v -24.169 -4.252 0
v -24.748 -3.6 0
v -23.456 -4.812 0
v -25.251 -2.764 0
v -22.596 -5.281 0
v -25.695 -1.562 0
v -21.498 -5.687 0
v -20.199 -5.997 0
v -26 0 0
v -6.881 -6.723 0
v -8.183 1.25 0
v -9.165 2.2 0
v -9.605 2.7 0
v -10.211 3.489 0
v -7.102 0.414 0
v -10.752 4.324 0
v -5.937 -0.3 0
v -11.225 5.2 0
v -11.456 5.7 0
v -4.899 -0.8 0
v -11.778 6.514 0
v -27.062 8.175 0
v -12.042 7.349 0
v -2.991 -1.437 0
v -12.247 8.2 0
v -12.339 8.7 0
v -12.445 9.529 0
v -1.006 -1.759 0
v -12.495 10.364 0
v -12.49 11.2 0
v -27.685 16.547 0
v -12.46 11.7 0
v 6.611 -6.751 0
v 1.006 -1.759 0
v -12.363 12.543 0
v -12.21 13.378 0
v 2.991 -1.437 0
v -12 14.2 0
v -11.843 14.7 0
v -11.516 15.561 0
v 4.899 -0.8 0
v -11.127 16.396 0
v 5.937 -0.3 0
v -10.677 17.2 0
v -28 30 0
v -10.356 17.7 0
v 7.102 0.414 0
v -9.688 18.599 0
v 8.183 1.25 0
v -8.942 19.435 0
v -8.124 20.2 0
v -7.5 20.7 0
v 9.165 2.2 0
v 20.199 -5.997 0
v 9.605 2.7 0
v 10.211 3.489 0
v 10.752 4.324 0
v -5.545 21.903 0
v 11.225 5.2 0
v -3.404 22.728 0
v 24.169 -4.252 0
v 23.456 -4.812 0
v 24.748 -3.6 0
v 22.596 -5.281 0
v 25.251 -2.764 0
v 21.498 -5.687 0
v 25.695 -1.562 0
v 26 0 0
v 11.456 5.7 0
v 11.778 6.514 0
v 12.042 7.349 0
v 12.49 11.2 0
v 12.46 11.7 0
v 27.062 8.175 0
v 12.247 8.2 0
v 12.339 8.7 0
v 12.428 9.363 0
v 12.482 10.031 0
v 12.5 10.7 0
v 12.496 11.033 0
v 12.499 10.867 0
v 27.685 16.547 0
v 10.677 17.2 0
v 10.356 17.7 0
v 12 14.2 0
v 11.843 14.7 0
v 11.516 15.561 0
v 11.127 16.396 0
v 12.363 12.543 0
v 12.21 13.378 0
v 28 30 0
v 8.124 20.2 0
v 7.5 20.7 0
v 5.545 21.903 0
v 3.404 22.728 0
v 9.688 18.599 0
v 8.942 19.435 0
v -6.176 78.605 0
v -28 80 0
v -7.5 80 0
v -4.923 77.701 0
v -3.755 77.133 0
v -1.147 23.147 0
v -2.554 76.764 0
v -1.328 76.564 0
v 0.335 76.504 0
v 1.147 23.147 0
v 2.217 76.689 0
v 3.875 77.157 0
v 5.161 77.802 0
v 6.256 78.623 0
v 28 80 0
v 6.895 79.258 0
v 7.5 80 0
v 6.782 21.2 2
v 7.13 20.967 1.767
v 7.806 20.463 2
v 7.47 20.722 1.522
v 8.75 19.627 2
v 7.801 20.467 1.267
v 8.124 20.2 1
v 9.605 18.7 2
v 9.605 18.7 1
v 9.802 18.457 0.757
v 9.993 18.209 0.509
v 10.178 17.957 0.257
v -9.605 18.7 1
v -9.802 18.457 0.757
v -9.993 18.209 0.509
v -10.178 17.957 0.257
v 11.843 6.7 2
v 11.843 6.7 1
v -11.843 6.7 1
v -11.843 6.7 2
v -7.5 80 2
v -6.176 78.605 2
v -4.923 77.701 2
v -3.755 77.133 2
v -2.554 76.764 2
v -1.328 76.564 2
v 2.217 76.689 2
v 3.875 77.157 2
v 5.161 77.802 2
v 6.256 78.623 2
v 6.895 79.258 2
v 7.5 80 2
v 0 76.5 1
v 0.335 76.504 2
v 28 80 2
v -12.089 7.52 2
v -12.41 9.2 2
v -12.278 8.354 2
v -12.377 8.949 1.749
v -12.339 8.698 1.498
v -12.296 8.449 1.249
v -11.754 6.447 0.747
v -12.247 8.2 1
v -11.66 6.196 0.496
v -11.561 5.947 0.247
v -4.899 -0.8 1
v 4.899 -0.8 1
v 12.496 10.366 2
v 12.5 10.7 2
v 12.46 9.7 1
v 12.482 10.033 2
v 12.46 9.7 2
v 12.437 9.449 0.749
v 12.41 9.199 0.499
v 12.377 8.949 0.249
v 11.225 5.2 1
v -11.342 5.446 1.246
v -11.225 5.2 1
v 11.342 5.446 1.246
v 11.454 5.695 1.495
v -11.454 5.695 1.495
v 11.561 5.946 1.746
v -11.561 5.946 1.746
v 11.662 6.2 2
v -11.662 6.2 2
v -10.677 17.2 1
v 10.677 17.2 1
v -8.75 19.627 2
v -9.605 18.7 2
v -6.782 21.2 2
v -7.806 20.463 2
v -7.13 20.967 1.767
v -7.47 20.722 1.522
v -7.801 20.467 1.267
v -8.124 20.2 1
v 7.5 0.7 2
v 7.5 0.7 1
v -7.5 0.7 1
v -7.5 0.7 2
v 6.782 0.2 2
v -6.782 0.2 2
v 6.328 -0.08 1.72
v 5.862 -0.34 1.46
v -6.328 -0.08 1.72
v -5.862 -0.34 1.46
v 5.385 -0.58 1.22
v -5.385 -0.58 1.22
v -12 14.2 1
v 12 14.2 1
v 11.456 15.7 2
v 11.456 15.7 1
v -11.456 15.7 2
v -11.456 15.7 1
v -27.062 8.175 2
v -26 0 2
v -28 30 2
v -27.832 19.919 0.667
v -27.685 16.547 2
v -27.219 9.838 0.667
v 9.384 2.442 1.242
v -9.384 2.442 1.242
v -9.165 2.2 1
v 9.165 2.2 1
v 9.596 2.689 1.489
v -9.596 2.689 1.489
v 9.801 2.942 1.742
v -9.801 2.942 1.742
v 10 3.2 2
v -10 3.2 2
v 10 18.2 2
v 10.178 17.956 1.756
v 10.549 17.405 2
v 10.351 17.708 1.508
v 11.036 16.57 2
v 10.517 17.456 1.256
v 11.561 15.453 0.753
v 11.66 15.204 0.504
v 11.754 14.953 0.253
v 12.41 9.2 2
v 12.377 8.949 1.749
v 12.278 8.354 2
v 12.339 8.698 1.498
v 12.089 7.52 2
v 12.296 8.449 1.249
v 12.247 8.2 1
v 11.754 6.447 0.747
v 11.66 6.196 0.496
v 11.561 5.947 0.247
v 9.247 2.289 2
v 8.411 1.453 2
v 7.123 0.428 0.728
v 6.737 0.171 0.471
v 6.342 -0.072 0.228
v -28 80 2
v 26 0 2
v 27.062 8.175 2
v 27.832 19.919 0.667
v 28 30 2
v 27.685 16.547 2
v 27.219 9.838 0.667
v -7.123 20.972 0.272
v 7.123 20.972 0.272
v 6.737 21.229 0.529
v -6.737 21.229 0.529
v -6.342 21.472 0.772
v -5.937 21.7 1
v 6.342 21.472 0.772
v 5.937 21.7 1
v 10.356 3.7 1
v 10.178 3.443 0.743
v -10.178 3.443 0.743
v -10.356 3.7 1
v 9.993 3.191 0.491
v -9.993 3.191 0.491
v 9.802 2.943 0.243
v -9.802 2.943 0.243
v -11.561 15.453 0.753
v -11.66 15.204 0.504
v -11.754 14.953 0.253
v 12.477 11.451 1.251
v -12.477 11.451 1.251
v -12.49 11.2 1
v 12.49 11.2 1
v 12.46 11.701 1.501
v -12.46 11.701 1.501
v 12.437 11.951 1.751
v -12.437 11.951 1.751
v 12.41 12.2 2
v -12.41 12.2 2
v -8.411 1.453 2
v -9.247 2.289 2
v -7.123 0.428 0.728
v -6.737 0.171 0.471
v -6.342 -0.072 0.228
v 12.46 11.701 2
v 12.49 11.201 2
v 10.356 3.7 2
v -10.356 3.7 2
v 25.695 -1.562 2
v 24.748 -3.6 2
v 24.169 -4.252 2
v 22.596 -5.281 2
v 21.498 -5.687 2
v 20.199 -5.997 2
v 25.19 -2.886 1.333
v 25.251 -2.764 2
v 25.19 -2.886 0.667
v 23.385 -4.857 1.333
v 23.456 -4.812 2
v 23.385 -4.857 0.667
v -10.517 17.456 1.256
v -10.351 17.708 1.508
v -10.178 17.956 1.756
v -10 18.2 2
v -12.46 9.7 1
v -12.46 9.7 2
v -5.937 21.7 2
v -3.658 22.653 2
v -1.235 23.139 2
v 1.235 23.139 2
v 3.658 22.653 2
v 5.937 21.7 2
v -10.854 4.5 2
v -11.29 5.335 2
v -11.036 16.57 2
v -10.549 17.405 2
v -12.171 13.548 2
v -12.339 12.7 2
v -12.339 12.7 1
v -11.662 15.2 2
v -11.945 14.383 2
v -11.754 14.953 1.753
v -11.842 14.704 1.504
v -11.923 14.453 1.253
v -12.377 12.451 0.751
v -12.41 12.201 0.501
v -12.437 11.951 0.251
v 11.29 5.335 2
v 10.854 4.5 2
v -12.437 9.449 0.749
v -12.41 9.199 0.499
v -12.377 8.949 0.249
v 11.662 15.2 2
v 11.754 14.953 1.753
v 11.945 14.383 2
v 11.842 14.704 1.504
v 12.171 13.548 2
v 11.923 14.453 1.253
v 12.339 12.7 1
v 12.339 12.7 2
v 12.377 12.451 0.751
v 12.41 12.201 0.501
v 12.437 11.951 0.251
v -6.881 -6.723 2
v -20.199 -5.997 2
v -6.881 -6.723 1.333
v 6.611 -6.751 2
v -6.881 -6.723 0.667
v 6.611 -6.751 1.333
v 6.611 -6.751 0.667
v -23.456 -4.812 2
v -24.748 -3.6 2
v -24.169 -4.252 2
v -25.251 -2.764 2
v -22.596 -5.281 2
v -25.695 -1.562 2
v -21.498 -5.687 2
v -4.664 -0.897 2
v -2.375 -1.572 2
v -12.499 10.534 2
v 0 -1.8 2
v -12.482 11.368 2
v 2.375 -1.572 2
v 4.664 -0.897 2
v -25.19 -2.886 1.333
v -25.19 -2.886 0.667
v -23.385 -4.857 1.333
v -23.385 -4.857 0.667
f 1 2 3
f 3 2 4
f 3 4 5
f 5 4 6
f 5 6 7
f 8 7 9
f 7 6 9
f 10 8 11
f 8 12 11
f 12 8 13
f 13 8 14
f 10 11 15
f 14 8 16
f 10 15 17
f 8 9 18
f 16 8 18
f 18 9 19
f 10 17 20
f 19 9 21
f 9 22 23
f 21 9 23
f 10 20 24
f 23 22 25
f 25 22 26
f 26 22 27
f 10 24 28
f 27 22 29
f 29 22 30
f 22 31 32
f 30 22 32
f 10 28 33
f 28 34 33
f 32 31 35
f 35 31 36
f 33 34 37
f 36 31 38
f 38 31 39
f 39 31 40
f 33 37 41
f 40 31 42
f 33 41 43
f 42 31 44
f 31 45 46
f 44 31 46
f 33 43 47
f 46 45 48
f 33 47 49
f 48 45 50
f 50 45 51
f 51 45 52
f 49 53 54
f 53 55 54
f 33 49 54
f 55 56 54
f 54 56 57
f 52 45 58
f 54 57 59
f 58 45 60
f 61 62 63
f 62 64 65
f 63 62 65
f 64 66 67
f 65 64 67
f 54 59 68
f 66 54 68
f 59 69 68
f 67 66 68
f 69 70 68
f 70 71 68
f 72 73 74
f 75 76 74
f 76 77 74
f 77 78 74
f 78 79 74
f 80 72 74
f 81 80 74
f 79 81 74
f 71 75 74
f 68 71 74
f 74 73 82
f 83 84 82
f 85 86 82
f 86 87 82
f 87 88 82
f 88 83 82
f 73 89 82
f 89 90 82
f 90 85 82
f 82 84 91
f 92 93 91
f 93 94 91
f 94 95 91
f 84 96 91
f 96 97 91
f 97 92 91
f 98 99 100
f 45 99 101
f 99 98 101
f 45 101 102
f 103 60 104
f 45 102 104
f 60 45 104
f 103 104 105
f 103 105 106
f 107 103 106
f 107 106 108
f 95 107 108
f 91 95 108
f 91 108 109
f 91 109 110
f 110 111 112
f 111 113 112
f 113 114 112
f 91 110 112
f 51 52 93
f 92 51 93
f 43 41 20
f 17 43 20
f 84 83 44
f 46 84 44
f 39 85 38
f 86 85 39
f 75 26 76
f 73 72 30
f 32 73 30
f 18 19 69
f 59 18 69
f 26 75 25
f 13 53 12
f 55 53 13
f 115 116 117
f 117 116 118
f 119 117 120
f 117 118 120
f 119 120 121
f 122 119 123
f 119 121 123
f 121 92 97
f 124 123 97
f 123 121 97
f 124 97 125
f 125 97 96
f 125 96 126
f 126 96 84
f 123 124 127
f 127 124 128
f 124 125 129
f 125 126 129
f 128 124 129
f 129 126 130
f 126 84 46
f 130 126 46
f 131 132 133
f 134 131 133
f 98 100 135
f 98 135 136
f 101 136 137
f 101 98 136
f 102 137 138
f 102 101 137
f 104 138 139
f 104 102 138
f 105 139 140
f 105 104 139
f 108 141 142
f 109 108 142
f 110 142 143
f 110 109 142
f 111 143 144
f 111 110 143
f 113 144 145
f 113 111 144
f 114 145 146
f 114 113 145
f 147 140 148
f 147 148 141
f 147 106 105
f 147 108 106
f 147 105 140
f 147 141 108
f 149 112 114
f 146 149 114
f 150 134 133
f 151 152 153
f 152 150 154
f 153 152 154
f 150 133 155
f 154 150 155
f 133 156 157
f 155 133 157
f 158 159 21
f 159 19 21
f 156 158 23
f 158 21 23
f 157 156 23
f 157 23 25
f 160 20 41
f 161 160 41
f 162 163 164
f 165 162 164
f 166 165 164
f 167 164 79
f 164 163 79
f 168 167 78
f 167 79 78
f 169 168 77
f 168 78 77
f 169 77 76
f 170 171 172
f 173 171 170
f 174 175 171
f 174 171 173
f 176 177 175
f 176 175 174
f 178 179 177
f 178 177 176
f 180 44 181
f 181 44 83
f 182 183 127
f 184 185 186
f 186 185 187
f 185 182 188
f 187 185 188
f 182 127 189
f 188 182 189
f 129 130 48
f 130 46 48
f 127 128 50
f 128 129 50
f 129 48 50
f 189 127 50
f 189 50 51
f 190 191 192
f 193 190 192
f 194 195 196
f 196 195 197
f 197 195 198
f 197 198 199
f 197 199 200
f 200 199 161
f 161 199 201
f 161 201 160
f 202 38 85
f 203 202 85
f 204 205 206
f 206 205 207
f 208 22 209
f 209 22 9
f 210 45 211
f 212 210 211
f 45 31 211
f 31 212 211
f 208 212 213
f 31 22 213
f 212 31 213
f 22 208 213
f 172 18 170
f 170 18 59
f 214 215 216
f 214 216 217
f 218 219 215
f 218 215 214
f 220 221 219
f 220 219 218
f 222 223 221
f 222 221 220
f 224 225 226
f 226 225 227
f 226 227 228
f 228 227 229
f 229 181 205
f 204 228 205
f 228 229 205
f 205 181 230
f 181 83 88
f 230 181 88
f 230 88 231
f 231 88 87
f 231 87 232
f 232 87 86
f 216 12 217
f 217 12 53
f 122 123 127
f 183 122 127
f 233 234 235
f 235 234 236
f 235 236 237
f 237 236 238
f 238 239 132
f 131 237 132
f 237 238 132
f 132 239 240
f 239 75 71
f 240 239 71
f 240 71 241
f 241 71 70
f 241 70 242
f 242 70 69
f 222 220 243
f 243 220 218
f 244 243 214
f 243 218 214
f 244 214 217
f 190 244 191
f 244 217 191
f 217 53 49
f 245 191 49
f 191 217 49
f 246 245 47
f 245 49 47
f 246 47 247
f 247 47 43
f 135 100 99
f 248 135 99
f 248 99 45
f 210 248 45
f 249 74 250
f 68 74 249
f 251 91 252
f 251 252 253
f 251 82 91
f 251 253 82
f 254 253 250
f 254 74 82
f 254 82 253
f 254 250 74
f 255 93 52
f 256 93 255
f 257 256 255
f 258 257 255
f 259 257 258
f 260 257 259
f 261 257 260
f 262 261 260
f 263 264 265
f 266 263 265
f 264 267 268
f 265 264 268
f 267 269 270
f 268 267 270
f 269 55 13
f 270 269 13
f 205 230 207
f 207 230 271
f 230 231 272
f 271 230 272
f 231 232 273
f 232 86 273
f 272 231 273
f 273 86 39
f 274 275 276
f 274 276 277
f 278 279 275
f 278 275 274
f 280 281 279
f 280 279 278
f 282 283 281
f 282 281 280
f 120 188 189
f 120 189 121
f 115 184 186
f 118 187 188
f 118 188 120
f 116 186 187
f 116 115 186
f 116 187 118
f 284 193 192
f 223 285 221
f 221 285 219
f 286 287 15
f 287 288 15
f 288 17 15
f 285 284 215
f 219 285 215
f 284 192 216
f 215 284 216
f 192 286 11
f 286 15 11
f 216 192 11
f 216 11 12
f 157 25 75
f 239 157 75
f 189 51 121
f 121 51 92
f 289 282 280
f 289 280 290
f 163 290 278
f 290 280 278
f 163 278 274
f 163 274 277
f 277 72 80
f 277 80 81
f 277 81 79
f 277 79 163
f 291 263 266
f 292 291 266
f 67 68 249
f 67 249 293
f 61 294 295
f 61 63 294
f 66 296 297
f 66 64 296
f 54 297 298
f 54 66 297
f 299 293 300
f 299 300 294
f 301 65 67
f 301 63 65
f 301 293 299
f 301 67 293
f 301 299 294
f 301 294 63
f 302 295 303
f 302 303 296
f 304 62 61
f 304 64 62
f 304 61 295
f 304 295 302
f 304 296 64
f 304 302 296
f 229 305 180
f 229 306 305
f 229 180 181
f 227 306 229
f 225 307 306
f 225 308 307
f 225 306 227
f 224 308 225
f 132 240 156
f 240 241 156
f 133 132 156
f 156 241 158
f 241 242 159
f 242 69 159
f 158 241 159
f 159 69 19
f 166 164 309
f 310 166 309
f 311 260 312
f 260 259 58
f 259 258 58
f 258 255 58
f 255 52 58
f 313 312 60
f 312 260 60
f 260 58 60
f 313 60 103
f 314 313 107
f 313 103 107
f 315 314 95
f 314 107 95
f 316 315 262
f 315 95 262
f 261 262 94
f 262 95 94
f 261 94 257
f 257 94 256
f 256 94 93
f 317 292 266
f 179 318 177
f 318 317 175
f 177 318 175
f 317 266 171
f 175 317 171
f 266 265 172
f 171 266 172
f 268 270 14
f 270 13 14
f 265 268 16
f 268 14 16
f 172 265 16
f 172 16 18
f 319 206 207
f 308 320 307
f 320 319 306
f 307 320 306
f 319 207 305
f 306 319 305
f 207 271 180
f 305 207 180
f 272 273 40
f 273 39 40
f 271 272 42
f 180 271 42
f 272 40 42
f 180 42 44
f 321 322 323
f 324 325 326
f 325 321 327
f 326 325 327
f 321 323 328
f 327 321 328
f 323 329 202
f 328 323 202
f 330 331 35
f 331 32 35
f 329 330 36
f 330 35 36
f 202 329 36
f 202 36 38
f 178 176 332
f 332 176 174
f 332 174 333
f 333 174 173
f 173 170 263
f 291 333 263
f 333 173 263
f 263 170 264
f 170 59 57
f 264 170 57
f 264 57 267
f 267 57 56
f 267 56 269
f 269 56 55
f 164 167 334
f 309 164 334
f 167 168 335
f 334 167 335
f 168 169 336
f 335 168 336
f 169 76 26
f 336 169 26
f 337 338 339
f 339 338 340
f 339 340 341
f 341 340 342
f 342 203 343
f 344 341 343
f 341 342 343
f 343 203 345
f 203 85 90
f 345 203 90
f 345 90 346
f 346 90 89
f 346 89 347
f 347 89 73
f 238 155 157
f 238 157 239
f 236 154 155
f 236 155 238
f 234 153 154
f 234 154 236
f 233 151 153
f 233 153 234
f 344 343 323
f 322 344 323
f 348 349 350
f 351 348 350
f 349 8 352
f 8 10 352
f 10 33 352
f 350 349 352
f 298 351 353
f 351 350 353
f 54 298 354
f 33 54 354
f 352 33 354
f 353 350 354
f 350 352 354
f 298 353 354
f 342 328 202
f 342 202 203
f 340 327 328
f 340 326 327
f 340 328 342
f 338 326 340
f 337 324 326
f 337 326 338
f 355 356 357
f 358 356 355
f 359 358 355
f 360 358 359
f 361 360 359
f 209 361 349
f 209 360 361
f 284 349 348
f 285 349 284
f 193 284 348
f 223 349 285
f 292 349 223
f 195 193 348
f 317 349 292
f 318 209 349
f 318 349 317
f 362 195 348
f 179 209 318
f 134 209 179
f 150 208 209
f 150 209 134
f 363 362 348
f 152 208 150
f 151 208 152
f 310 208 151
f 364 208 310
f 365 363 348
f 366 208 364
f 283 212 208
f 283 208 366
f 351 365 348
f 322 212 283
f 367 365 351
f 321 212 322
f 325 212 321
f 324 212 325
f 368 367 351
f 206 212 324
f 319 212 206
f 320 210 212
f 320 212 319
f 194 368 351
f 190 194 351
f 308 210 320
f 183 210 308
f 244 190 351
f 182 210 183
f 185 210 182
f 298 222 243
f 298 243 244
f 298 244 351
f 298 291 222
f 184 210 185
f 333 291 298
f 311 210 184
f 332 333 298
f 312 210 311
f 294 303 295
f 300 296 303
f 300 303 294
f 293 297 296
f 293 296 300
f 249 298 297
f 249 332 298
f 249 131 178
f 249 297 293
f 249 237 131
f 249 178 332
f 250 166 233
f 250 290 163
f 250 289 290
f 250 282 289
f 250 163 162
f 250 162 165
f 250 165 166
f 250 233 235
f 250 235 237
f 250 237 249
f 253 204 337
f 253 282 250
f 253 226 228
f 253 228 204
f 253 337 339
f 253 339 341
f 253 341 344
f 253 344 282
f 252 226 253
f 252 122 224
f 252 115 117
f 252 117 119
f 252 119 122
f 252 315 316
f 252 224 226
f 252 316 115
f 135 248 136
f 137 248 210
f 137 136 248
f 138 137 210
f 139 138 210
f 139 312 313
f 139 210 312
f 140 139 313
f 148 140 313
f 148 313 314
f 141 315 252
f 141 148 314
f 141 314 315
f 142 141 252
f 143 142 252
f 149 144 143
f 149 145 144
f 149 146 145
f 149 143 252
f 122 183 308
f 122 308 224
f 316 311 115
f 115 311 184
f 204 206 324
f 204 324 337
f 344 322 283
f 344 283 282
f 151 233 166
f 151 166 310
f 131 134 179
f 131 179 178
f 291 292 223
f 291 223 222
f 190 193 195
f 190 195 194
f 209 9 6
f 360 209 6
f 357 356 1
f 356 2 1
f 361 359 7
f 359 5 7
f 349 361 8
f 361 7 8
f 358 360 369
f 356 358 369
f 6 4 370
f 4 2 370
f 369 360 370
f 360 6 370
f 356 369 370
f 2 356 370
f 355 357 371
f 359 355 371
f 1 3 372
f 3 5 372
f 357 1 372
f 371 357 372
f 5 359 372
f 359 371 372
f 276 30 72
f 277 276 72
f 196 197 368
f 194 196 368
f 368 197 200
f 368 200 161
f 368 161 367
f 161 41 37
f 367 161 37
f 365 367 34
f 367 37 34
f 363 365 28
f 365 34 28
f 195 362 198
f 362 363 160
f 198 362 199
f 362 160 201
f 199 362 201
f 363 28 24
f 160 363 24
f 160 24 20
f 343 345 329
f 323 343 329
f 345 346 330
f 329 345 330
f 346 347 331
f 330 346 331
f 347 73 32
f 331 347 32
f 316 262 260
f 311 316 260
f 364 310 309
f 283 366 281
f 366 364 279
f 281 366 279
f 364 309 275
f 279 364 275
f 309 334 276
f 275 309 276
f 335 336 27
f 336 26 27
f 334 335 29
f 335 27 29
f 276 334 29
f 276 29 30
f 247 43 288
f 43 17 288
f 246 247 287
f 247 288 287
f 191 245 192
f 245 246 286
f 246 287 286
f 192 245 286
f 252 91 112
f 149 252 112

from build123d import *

# Parameters (mm, degrees)
F1_DEPTH = 2
F2_SIZE  = 1


with BuildPart() as f1:
    # F0 (on Top) → F1 (new body)
    with BuildSketch(Plane.XY):
        with BuildLine():
            Line((-7.5, 80), (-28, 80))
            Line((-28, 80), (-28, 30))
            add(Edge.make_bspline(
                [(-28, 30), (-28, 20), (-27.575813, 9.636616), (-26, 0)],
                knots=[0, 0, 0, 0, 30.066593, 30.066593, 30.066593, 30.066593], degree=3))
            add(Edge.make_bspline(
                [(-26, 0), (-25.558101, -3.369557), (-24.204869, -5.246621), (-20.199219, -5.996692)],
                knots=[0, 0, 0, 0, 8.343223, 8.343223, 8.343223, 8.343223], degree=3))
            add(Edge.make_bspline(
                [(-20.199219, -5.996692), (-6.993402, -7.045466), (6.588119, -7.168934), (20.199219, -5.996692)],
                knots=[0, 0, 0, 0, 40.398437, 40.398437, 40.398437, 40.398437], degree=3))
            add(Edge.make_bspline(
                [(26, 0), (25.558101, -3.369557), (24.204869, -5.246621), (20.199219, -5.996692)],
                knots=[0, 0, 0, 0, 8.343223, 8.343223, 8.343223, 8.343223], degree=3))
            add(Edge.make_bspline(
                [(28, 30), (28, 20), (27.575813, 9.636616), (26, 0)],
                knots=[0, 0, 0, 0, 30.066593, 30.066593, 30.066593, 30.066593], degree=3))
            Line((28, 30), (28, 80))
            Line((28, 80), (7.5, 80))
            add(Edge.make_bspline(
                [(-7.5, 80), (-5.275334, 77.19822), (-0.081008, 75.80178), (5.43735, 77.19822), (7.5, 80)],
                knots=[0, 0, 0, 0, 8.276473, 16.552945, 16.552945, 16.552945, 16.552945], degree=3))
        make_face()
        with BuildLine():
            ThreePointArc((12.489996, 11.2), (12.497499, 10.95005), (12.5, 10.7))
            ThreePointArc((12.5, 10.7), (12.48998, 10.199599), (12.459936, 9.7))
            ThreePointArc((12.459936, 9.7), (12.376438, 8.946778), (12.247449, 8.2))
            ThreePointArc((12.247449, 8.2), (12.068411, 7.443706), (11.842719, 6.7))
            ThreePointArc((11.842719, 6.7), (11.558205, 5.939968), (11.224972, 5.2))
            ThreePointArc((11.224972, 5.2), (10.816598, 4.434921), (10.356158, 3.7))
            ThreePointArc((10.356158, 3.7), (9.789427, 2.927155), (9.165151, 2.2))
            ThreePointArc((9.165151, 2.2), (8.366261, 1.412606), (7.5, 0.7))
            ThreePointArc((7.5, 0.7), (6.244692, -0.128381), (4.898979, -0.8))
            ThreePointArc((4.898979, -0.8), (0, -1.8), (-4.898979, -0.8))
            ThreePointArc((-4.898979, -0.8), (-6.244692, -0.128381), (-7.5, 0.7))
            ThreePointArc((-7.5, 0.7), (-8.366261, 1.412606), (-9.165151, 2.2))
            ThreePointArc((-9.165151, 2.2), (-9.789427, 2.927155), (-10.356158, 3.7))
            ThreePointArc((-10.356158, 3.7), (-10.816598, 4.434921), (-11.224972, 5.2))
            ThreePointArc((-11.224972, 5.2), (-11.558205, 5.939968), (-11.842719, 6.7))
            ThreePointArc((-11.842719, 6.7), (-12.068411, 7.443706), (-12.247449, 8.2))
            ThreePointArc((-12.247449, 8.2), (-12.376438, 8.946778), (-12.459936, 9.7))
            ThreePointArc((-12.459936, 9.7), (-12.497491, 10.449549), (-12.489996, 11.2))
            ThreePointArc((-12.489996, 11.2), (-12.437114, 11.952279), (-12.338963, 12.7))
            ThreePointArc((-12.338963, 12.7), (-12.192571, 13.455218), (-12, 14.2))
            ThreePointArc((-12, 14.2), (-11.752176, 14.958681), (-11.456439, 15.7))
            ThreePointArc((-11.456439, 15.7), (-11.092144, 16.463189), (-10.677078, 17.2))
            ThreePointArc((-10.677078, 17.2), (-10.168579, 17.969801), (-9.604686, 18.7))
            ThreePointArc((-9.604686, 18.7), (-8.896034, 19.481263), (-8.124038, 20.2))
            ThreePointArc((-8.124038, 20.2), (-7.070495, 21.008157), (-5.937171, 21.7))
            ThreePointArc((-5.937171, 21.7), (0, 23.2), (5.937171, 21.7))
            ThreePointArc((5.937171, 21.7), (7.070495, 21.008157), (8.124038, 20.2))
            ThreePointArc((8.124038, 20.2), (8.896034, 19.481263), (9.604686, 18.7))
            ThreePointArc((9.604686, 18.7), (10.168579, 17.969801), (10.677078, 17.2))
            ThreePointArc((10.677078, 17.2), (11.092144, 16.463189), (11.456439, 15.7))
            ThreePointArc((11.456439, 15.7), (11.752176, 14.958681), (12, 14.2))
            ThreePointArc((12, 14.2), (12.192571, 13.455218), (12.338963, 12.7))
            ThreePointArc((12.338963, 12.7), (12.437114, 11.952279), (12.489996, 11.2))
        make_face(mode=Mode.SUBTRACT)
        with BuildLine():
            Line((-8.124038, 20.2), (8.124038, 20.2))
            ThreePointArc((8.124038, 20.2), (7.070495, 21.008157), (5.937171, 21.7))
            Line((5.937171, 21.7), (-5.937171, 21.7))
            ThreePointArc((-5.937171, 21.7), (-7.070495, 21.008157), (-8.124038, 20.2))
        make_face()
        with BuildLine():
            Line((-10.677078, 17.2), (10.677078, 17.2))
            ThreePointArc((10.677078, 17.2), (10.168579, 17.969801), (9.604686, 18.7))
            Line((9.604686, 18.7), (-9.604686, 18.7))
            ThreePointArc((-9.604686, 18.7), (-10.168579, 17.969801), (-10.677078, 17.2))
        make_face()
        with BuildLine():
            Line((-12, 14.2), (12, 14.2))
            ThreePointArc((12, 14.2), (11.752176, 14.958681), (11.456439, 15.7))
            Line((11.456439, 15.7), (-11.456439, 15.7))
            ThreePointArc((-11.456439, 15.7), (-11.752176, 14.958681), (-12, 14.2))
        make_face()
        with BuildLine():
            Line((-12.489996, 11.2), (12.489996, 11.2))
            ThreePointArc((12.489996, 11.2), (12.437114, 11.952279), (12.338963, 12.7))
            Line((12.338963, 12.7), (-12.338963, 12.7))
            ThreePointArc((-12.338963, 12.7), (-12.437114, 11.952279), (-12.489996, 11.2))
        make_face()
        with BuildLine():
            ThreePointArc((12.247449, 8.2), (12.376438, 8.946778), (12.459936, 9.7))
            Line((12.459936, 9.7), (-12.459936, 9.7))
            ThreePointArc((-12.459936, 9.7), (-12.376438, 8.946778), (-12.247449, 8.2))
            Line((-12.247449, 8.2), (12.247449, 8.2))
        make_face()
        with BuildLine():
            ThreePointArc((11.224972, 5.2), (11.558205, 5.939968), (11.842719, 6.7))
            Line((11.842719, 6.7), (-11.842719, 6.7))
            ThreePointArc((-11.842719, 6.7), (-11.558205, 5.939968), (-11.224972, 5.2))
            Line((-11.224972, 5.2), (11.224972, 5.2))
        make_face()
        with BuildLine():
            ThreePointArc((9.165151, 2.2), (9.789427, 2.927155), (10.356158, 3.7))
            Line((10.356158, 3.7), (-10.356158, 3.7))
            ThreePointArc((-10.356158, 3.7), (-9.789427, 2.927155), (-9.165151, 2.2))
            Line((-9.165151, 2.2), (9.165151, 2.2))
        make_face()
        with BuildLine():
            ThreePointArc((4.898979, -0.8), (6.244692, -0.128381), (7.5, 0.7))
            Line((7.5, 0.7), (-7.5, 0.7))
            ThreePointArc((-7.5, 0.7), (-6.244692, -0.128381), (-4.898979, -0.8))
            Line((-4.898979, -0.8), (4.898979, -0.8))
        make_face()
    extrude(amount=F1_DEPTH)

    # F2
    f2_edges = [f1.edges().sort_by_distance(p)[0] for p in [
        (0, 21.7, 0),
        (0, 18.7, 0),
        (0, 15.7, 0),
        (0, 12.7, 0),
        (0, 9.7, 0),
        (0, 6.7, 0),
        (0, 3.7, 0),
        (0, 0.7, 0),
        (0, 20.2, 2),
        (0, 17.2, 2),
        (0, 14.2, 2),
        (0, 11.2, 2),
        (0, 8.2, 2),
        (0, 5.2, 2),
        (0, -0.8, 2),
        (0, 2.2, 2),
    ]]
    chamfer(f2_edges, length=F2_SIZE)


solid = f1.part
